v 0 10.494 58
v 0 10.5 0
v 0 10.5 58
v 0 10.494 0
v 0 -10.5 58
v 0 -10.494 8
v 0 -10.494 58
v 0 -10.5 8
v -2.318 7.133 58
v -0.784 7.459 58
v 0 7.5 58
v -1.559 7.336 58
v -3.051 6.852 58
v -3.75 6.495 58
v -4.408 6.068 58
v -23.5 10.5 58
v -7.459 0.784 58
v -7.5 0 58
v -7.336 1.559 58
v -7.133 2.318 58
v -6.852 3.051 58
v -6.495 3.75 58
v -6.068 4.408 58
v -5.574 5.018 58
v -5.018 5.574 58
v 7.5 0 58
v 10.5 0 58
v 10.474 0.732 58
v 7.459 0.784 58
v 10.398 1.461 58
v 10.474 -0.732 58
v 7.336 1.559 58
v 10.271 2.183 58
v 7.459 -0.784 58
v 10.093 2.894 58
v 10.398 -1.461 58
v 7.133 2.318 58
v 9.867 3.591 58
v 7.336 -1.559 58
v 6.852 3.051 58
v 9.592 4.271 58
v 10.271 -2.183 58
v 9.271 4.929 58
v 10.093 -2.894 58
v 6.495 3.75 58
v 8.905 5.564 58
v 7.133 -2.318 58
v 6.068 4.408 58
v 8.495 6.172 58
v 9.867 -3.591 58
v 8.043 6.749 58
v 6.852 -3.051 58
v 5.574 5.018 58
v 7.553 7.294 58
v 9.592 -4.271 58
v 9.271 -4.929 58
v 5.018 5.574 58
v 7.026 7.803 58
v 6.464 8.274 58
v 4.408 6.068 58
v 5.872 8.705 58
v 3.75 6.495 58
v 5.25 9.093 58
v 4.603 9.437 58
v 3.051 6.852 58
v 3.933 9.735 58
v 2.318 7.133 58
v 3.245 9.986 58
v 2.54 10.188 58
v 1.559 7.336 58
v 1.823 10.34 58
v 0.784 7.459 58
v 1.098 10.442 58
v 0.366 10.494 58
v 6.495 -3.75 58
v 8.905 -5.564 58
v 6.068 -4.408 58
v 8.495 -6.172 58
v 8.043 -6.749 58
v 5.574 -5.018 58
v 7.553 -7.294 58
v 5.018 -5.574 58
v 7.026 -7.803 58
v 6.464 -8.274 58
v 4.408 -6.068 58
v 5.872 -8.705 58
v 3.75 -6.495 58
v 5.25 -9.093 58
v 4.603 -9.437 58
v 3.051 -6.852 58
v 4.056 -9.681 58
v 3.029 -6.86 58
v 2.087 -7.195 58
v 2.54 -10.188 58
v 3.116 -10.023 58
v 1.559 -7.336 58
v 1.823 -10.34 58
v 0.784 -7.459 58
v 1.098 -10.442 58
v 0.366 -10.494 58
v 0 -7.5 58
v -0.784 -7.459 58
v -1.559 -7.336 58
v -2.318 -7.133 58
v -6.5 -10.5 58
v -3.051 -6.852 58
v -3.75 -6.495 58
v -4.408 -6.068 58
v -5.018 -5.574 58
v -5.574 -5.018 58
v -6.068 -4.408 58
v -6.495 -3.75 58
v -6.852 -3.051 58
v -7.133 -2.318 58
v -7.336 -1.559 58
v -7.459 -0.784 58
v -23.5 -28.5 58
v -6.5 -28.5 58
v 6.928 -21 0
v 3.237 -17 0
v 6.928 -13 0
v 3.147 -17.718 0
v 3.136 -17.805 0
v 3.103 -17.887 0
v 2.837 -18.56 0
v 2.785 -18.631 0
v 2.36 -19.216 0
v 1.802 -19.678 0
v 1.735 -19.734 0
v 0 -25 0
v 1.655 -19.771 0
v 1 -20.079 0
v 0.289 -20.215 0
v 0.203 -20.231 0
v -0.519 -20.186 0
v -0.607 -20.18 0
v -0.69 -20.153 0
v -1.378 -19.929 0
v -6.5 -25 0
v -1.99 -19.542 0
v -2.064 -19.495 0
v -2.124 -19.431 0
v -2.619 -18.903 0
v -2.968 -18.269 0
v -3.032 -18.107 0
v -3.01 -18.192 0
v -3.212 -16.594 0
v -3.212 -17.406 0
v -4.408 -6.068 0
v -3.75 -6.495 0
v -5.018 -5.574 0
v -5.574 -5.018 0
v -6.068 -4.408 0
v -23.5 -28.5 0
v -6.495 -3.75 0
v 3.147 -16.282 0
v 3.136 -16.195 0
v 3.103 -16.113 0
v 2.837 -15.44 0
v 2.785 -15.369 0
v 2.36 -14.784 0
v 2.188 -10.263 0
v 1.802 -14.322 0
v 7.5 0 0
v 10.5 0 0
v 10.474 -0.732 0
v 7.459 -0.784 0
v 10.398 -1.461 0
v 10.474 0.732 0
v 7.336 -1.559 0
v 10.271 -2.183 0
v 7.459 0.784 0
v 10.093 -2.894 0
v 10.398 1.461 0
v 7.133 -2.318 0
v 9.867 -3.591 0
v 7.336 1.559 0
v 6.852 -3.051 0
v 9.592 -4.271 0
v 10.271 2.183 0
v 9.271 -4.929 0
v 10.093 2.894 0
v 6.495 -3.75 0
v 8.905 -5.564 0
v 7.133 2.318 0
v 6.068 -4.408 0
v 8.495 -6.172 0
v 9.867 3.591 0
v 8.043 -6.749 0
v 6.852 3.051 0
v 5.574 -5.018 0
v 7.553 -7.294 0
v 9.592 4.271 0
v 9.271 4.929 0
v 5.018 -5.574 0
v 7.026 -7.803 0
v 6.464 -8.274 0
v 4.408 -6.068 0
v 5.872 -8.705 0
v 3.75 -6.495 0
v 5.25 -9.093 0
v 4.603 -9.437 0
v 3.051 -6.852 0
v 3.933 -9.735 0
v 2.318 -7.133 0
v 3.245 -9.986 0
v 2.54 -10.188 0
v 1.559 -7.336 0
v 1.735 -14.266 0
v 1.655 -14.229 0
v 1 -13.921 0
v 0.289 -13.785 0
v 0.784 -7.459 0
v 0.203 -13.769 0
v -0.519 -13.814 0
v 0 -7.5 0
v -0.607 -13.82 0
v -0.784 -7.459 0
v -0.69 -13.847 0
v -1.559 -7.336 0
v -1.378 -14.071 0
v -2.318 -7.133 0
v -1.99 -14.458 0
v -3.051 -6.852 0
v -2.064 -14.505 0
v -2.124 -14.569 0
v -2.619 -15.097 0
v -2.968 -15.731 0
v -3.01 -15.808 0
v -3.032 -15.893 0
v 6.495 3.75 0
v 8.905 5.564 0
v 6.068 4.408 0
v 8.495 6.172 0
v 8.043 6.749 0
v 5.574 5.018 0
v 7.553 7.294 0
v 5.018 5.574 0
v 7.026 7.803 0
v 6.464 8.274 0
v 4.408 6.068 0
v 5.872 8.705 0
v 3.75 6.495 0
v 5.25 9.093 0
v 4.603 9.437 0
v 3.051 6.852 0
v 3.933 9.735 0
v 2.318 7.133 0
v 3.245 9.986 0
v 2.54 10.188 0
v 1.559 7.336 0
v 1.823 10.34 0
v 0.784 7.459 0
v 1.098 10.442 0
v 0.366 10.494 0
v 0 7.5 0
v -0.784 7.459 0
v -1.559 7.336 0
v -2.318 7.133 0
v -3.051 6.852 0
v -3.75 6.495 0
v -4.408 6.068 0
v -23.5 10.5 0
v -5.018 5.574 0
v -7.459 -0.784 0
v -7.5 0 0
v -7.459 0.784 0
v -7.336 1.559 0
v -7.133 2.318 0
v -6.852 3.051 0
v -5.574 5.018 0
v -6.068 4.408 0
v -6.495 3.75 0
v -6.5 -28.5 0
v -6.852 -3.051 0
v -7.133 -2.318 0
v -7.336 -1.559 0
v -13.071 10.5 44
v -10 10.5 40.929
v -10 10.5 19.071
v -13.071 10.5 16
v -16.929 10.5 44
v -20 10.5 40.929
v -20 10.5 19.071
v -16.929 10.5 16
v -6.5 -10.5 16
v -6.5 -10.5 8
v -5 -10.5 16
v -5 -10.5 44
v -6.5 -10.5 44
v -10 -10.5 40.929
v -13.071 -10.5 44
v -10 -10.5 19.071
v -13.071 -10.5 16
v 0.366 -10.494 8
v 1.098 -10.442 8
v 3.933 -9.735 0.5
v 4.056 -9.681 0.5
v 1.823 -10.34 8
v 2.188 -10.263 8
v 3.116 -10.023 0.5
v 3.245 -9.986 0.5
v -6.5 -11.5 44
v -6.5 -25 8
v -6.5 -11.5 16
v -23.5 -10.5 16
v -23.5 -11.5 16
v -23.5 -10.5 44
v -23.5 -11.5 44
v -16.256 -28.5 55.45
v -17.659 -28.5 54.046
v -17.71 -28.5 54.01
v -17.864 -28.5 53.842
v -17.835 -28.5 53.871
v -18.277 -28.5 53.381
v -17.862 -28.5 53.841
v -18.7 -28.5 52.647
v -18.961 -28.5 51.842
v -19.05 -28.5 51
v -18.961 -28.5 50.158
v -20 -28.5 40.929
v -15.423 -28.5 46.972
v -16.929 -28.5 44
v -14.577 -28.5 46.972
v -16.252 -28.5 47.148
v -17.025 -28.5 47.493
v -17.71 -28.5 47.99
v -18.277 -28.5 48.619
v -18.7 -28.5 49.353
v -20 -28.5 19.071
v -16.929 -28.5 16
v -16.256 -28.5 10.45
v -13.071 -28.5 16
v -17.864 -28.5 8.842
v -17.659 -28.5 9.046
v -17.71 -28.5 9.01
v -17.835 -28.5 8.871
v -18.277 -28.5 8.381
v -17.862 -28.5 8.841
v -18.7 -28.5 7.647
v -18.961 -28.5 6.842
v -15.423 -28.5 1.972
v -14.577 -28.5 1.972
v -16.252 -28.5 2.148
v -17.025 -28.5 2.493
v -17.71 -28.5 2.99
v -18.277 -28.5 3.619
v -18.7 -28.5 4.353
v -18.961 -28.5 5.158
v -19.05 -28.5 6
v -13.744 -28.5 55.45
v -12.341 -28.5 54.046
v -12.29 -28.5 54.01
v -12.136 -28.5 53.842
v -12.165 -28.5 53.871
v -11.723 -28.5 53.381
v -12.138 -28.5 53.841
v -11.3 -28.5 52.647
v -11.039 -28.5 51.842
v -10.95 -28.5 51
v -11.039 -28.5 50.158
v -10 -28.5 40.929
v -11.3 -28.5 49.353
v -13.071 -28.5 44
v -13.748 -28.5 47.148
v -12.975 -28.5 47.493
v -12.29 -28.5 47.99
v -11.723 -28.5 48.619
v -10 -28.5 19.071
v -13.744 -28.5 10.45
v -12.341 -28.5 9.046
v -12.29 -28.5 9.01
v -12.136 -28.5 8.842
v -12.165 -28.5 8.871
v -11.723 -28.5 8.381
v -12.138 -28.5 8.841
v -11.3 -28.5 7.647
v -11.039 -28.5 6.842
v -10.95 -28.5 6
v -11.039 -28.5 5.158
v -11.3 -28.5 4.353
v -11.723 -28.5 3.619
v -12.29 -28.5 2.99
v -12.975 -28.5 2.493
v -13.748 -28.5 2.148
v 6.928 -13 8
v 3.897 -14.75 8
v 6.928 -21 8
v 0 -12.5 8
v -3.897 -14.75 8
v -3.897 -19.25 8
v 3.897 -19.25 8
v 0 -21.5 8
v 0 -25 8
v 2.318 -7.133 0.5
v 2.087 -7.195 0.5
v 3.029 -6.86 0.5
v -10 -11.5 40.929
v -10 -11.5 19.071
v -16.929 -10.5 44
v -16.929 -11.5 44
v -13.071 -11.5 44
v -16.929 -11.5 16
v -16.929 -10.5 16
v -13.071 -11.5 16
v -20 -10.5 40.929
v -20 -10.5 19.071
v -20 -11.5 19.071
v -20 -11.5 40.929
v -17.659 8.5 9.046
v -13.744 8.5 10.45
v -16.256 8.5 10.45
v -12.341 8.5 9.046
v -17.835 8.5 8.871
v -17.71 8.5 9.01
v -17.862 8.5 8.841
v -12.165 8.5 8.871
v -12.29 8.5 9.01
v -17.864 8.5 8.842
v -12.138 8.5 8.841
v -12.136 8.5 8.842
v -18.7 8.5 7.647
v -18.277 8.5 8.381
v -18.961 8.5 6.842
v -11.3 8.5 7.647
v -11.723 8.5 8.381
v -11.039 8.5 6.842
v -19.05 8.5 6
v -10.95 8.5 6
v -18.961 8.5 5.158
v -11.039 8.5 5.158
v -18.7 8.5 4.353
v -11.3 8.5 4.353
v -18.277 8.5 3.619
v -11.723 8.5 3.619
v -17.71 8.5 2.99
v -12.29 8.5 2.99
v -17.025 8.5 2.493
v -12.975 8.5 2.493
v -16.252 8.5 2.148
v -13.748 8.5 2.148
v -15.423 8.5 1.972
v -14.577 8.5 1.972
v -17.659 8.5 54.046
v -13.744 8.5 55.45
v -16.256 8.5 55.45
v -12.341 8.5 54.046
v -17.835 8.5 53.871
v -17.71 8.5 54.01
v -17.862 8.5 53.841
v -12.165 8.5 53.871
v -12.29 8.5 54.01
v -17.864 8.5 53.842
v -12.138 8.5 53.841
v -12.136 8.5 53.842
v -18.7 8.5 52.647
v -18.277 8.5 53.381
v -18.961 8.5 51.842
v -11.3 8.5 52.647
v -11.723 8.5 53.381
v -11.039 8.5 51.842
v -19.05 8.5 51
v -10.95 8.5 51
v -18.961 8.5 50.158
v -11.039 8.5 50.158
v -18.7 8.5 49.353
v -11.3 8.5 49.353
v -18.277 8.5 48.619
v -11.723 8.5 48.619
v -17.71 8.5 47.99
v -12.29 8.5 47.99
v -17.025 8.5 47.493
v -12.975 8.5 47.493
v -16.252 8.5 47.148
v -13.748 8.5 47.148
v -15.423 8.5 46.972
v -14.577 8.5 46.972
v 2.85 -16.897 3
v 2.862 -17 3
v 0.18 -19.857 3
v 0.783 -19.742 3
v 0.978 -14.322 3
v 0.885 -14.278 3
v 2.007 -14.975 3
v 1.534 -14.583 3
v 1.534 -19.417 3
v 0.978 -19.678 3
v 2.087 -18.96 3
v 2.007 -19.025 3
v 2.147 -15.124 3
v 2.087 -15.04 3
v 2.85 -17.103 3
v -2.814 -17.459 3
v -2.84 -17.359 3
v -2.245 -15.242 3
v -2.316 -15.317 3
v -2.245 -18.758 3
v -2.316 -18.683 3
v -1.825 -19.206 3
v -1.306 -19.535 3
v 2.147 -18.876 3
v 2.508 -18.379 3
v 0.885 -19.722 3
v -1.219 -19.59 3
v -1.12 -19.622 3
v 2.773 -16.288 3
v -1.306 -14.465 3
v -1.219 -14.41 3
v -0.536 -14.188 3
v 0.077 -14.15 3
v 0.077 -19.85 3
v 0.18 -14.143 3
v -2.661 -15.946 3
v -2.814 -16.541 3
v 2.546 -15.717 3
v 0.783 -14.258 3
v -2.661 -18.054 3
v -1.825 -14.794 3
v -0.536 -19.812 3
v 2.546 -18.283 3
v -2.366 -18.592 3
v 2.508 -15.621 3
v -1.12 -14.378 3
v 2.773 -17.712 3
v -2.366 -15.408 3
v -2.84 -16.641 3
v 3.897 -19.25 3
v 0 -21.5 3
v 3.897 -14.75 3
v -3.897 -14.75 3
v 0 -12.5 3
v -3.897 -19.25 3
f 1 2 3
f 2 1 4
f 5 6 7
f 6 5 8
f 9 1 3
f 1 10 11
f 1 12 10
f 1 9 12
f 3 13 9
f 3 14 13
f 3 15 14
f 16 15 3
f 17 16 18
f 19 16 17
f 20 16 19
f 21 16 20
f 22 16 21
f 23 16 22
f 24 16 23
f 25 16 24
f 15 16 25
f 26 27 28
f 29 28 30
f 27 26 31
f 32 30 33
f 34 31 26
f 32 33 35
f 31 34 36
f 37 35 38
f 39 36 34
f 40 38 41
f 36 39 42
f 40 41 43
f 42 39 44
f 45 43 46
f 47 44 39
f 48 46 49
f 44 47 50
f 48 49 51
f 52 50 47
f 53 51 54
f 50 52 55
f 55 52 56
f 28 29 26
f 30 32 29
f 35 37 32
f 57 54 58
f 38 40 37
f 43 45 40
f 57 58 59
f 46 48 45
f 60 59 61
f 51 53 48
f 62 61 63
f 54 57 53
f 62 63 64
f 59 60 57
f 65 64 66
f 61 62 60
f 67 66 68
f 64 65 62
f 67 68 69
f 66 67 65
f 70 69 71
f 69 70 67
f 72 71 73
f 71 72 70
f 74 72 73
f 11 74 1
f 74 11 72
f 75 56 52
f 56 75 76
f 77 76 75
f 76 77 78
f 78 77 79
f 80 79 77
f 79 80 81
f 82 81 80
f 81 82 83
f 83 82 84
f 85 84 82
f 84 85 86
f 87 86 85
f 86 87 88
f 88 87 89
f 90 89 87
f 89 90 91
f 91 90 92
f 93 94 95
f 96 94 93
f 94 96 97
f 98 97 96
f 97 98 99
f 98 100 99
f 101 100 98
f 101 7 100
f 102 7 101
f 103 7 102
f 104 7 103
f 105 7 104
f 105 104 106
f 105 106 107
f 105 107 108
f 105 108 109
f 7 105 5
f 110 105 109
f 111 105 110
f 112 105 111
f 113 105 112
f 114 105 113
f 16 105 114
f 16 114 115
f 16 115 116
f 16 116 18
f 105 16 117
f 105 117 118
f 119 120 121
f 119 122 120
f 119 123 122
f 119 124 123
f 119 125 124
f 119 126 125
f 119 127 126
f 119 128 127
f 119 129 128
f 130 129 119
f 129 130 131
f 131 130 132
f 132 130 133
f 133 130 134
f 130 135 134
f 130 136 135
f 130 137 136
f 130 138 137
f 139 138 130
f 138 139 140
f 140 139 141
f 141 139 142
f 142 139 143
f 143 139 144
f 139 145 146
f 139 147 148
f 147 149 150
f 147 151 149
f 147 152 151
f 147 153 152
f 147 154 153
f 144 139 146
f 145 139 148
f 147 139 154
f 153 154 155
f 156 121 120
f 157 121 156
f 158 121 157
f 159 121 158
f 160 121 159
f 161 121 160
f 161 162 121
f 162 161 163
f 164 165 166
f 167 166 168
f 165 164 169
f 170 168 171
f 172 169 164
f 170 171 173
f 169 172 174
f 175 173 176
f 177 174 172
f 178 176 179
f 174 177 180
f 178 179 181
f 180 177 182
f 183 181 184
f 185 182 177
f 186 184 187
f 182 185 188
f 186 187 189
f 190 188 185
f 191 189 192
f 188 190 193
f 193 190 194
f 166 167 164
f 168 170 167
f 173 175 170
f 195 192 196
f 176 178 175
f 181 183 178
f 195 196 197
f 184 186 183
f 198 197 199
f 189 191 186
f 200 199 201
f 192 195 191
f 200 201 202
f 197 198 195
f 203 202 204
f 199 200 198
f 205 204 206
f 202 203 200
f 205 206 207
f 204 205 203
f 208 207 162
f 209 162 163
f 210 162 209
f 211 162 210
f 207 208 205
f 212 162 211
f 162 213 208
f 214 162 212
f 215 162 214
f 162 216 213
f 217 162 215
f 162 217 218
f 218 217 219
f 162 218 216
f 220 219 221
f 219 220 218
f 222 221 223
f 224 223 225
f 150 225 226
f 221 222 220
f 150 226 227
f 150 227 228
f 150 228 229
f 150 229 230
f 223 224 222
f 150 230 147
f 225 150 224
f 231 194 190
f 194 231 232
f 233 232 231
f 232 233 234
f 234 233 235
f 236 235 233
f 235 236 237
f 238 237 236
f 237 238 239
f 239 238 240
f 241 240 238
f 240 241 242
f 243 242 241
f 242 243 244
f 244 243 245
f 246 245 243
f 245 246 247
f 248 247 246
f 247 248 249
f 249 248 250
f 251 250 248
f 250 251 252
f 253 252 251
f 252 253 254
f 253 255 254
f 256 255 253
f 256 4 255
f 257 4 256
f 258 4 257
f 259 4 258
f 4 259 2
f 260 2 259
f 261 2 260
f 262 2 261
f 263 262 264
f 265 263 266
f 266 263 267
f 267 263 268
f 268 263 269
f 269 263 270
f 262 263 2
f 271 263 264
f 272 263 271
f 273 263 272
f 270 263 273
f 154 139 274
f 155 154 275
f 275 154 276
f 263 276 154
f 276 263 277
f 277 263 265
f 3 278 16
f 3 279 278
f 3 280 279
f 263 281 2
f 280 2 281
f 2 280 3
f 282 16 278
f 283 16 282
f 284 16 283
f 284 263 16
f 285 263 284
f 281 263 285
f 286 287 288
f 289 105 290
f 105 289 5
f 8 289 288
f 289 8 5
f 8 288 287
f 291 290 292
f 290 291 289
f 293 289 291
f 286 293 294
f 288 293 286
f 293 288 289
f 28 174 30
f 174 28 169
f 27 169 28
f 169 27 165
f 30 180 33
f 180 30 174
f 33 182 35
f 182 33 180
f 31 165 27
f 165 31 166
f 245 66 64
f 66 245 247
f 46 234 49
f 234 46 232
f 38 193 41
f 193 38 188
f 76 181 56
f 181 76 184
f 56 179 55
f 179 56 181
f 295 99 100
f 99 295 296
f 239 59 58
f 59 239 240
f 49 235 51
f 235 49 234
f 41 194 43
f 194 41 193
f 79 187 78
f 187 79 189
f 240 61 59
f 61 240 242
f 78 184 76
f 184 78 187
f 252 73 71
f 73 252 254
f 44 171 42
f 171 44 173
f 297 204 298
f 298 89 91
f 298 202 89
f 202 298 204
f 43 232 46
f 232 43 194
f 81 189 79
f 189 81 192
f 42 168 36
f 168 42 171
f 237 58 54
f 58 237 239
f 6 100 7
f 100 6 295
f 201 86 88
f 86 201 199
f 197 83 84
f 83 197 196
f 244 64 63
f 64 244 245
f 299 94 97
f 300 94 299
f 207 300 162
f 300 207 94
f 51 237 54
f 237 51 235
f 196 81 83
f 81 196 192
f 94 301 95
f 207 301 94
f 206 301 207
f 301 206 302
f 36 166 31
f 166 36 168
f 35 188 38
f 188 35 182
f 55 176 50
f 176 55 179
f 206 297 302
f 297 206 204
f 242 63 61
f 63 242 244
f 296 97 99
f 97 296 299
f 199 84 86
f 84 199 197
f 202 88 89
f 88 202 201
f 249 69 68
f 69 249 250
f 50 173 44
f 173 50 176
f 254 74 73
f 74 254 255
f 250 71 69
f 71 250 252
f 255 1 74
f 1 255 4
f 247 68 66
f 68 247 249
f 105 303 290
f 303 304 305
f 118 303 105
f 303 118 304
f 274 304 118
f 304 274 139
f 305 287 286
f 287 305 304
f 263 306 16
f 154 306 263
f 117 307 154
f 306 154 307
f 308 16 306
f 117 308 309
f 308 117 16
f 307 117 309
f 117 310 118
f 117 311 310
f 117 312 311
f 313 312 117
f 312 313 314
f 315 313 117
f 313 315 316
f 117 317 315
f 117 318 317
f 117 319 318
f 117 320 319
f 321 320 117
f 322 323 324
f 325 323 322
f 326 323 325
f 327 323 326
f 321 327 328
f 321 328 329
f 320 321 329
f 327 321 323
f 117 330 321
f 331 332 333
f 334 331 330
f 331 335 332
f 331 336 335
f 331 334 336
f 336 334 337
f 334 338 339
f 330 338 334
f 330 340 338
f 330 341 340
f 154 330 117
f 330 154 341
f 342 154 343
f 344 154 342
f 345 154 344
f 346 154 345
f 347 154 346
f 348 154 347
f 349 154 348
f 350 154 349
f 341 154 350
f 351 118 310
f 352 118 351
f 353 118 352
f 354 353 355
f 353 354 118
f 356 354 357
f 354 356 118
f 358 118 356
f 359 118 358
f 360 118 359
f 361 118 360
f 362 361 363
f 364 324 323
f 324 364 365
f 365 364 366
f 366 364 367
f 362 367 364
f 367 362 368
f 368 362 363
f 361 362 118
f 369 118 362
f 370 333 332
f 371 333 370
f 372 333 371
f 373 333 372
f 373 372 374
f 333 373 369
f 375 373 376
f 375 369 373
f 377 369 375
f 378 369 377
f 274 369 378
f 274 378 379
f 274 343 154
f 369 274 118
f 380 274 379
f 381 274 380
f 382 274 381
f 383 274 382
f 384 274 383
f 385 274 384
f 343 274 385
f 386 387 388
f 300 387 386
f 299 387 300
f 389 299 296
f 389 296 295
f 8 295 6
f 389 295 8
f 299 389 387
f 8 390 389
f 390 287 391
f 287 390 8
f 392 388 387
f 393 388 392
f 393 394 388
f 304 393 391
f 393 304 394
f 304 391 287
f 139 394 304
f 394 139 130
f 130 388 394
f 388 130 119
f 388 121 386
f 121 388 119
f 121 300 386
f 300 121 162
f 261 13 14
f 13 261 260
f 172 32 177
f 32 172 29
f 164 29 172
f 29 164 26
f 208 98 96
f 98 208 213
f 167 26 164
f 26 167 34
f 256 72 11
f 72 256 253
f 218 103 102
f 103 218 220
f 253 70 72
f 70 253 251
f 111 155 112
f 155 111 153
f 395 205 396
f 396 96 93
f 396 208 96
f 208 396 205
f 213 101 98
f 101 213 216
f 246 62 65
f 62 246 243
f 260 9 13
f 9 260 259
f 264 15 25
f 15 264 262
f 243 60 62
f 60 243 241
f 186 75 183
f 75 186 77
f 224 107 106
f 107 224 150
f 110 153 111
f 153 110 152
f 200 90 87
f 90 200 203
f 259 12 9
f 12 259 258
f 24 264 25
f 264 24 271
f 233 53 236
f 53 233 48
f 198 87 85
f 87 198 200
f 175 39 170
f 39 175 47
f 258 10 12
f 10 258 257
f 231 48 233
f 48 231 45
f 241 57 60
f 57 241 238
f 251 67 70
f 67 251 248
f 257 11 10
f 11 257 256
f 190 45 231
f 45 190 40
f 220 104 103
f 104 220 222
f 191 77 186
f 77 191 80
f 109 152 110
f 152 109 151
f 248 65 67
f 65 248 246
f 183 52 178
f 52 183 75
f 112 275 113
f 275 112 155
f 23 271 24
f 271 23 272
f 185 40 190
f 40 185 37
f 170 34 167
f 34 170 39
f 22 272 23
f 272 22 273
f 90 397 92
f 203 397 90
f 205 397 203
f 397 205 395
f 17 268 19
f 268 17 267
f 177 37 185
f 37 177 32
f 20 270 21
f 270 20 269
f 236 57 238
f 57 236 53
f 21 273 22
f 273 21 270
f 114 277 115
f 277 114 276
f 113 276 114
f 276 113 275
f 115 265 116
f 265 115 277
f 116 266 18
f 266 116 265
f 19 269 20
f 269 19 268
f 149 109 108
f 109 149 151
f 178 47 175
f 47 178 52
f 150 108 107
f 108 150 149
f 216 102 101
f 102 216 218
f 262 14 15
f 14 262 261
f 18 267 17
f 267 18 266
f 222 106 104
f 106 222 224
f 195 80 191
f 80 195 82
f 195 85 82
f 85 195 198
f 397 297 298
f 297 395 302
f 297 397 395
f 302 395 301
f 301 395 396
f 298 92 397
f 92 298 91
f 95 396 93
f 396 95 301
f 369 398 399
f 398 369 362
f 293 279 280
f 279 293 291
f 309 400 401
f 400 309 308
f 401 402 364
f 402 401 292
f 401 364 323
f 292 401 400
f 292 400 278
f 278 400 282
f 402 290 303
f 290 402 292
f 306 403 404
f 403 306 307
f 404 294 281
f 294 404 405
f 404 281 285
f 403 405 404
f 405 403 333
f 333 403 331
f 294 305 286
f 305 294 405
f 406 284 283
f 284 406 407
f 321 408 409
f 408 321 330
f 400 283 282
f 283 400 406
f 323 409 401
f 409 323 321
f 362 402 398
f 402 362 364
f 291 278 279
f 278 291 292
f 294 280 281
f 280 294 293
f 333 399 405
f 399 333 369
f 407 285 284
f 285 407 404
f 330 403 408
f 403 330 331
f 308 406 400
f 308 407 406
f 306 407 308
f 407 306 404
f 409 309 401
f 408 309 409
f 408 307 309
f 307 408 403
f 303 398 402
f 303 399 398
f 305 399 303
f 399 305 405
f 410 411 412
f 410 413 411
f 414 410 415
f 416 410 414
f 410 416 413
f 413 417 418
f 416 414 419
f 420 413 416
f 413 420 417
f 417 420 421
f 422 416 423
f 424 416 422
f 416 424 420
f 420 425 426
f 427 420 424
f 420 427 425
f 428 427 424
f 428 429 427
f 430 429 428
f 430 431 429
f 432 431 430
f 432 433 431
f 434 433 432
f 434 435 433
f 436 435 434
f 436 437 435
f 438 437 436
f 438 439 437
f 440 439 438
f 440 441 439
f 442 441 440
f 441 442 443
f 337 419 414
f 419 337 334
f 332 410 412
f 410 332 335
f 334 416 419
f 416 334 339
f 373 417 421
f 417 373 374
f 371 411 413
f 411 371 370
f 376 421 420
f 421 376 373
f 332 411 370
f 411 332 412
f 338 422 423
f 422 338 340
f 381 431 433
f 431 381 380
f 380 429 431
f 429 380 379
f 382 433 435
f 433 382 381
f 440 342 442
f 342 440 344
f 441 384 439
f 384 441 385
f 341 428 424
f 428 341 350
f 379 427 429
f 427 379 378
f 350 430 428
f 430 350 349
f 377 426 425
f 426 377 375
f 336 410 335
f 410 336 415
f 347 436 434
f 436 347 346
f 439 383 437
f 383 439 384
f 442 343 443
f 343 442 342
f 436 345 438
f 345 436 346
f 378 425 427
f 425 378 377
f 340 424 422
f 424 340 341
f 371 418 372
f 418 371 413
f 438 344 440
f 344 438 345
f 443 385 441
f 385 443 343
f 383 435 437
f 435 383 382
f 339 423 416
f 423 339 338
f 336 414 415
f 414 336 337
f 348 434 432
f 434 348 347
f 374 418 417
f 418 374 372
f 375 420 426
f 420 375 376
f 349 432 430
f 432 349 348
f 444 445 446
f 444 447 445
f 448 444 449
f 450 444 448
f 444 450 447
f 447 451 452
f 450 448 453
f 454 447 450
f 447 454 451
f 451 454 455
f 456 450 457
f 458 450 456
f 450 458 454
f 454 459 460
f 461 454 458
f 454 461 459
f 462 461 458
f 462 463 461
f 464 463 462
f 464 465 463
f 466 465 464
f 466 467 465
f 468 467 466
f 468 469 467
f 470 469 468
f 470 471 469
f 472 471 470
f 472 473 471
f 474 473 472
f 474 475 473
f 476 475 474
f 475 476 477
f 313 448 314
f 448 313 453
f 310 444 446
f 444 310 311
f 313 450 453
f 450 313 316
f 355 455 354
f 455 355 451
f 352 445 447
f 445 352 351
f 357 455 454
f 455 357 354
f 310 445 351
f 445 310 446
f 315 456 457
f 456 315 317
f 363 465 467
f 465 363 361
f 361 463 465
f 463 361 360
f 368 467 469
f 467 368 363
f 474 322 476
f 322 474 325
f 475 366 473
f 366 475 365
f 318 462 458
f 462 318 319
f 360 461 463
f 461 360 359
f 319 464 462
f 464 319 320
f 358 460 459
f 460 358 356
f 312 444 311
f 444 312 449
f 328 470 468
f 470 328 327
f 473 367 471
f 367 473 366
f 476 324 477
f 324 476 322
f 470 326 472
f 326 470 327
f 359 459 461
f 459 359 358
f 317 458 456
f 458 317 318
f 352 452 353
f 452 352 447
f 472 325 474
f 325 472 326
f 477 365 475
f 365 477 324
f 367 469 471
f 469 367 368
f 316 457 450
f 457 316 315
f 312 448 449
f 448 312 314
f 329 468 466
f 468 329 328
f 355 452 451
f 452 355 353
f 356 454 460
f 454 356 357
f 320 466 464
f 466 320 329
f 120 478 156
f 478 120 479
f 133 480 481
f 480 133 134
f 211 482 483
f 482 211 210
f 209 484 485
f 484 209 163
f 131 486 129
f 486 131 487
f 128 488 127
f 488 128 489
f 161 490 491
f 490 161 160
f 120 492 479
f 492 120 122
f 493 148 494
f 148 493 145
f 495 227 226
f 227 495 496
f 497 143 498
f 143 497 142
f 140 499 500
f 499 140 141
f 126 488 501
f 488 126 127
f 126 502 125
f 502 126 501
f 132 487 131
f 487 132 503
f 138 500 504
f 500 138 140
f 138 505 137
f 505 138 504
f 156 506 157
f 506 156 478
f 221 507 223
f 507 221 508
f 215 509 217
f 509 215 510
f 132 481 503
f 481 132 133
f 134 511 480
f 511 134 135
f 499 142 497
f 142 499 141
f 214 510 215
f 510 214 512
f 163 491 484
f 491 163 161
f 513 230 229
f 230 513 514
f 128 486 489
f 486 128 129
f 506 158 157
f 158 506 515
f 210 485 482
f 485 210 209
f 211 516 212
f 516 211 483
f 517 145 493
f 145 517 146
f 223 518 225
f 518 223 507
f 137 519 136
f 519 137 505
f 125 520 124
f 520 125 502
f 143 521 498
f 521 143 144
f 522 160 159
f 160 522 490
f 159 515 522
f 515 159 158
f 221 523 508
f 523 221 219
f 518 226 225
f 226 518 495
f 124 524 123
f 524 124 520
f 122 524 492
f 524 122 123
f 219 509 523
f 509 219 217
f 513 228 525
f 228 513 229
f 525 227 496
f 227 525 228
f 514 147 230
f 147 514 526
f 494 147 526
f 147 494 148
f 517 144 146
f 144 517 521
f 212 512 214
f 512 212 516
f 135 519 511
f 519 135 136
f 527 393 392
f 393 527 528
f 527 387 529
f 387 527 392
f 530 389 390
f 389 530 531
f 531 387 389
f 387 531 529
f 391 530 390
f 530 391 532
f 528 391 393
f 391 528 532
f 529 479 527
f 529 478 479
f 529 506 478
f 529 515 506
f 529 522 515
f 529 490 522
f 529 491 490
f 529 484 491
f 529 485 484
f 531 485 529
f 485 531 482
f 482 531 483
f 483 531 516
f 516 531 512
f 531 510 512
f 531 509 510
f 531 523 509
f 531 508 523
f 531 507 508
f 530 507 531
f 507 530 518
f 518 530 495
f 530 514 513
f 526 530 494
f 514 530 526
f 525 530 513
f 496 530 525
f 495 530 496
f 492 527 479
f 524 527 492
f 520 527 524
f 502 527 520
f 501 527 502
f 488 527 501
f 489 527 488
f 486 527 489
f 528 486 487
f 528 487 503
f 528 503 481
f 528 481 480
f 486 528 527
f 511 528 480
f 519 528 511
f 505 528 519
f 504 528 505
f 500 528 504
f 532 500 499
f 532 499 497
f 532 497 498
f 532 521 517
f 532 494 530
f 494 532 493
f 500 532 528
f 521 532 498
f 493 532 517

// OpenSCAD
// file: bearing.scad
// PRUSA iteration3
// Bearing holders
// GNU GPL v3
// Josef Průša <iam@josefprusa.cz> and contributors
// http://www.reprap.org/wiki/Prusa_Mendel
// http://prusamendel.org

bearing_diameter = 15;

module horizontal_bearing_base(bearings=1){
 translate(v=[0,0,6]) cube(size = [24,8+bearings*25,12], center = true);	
}
module horizontal_bearing_holes(bearings=1){
 cutter_lenght = 10+bearings*25;
 one_holder_lenght = 8+25;
 holder_lenght = 8+bearings*25;
 
 // Main bearing cut
 difference(){
  translate(v=[0,0,12]) rotate(a=[90,0,0]) translate(v=[0,0,-cutter_lenght/2]) cylinder(h = cutter_lenght, r=bearing_diameter/2, $fn=50);
  // Bearing retainers
  translate(v=[0,1-holder_lenght/2,3]) cube(size = [24,6,8], center = true);
  translate(v=[0,-1+holder_lenght/2,3]) cube(size = [24,6,8], center = true);
 }
 
 // Ziptie cutouts
 ziptie_cut_ofset = 0;
 for ( i = [0 : bearings-1] ){
  // For easier positioning I move them by half of one 
  // bearing holder then add each bearign lenght and then center again
  translate(v=[0,-holder_lenght/2,0]) translate(v=[0,one_holder_lenght/2+i*25,0]) difference(){
   union(){
    translate(v=[0,2-6,12]) rotate(a=[90,0,0]) translate(v=[0,0,0]) cylinder(h = 4, r=12.5, $fn=50);
    translate(v=[0,2+6,12]) rotate(a=[90,0,0]) translate(v=[0,0,0]) cylinder(h = 4, r=12.5, $fn=50);
   }
   translate(v=[0,10,12]) rotate(a=[90,0,0]) translate(v=[0,0,0]) cylinder(h = 24, r=10, $fn=50);
  }
 }
 
}

module horizontal_bearing_test(){
 difference(){
  horizontal_bearing_base(1);
  horizontal_bearing_holes(1);
 }
 translate(v=[30,0,0]) difference(){
  horizontal_bearing_base(2);
  horizontal_bearing_holes(2);
 }
 translate(v=[60,0,0]) difference(){
  horizontal_bearing_base(3);
  horizontal_bearing_holes(3);
 }
}



thinwall = 3;
bearing_size = bearing_diameter + 2 * thinwall;

module vertical_bearing_base(){
 translate(v=[-2-bearing_size/4,0,29]) cube(size = [4+bearing_size/2,bearing_size,58], center = true);
 cylinder(h = 58, r=bearing_size/2, $fn = 90);
}

module vertical_bearing_holes(){
  translate(v=[0,0,-1]) cylinder(h = 62, r=bearing_diameter/2, $fn = 60);
  rotate(a=[0,0,-70]) translate(v=[8,0,31.5]) cube(size = [5,1,62], center = true);
}

difference(){
vertical_bearing_base();
vertical_bearing_holes();
}
// main file
// PRUSA iteration3
// X end prototype
// GNU GPL v3
// Josef Průša <iam@josefprusa.cz> and contributors
// http://www.reprap.org/wiki/Prusa_Mendel
// http://prusamendel.org

use <bearing.scad>
rod_distance = 45;

module x_end_base(){
// Main block
height = 58;
translate(v=[-15,-9,height/2]) cube(size = [17,39,height], center = true);
// Bearing holder
 vertical_bearing_base();	
//Nut trap
 // Cube
 translate(v=[-2-2,-17,4]) cube(size = [8,16,8], center = true);
 // Hexagon
 translate(v=[0,-17,0]) rotate([0,0,30]) cylinder(h = 8, r=8, $fn = 6);
}

module x_end_holes(){
 vertical_bearing_holes();
// Belt hole
translate(v=[-1,0,0]){
// Stress relief
translate(v=[-5.5-10+1.5,-10-1,30]) cube(size = [20,1,28], center = true);
difference(){
	translate(v=[-5.5-10+1.5,-10,30]) cube(size = [10,46,28], center = true);

	

	// Nice edges
	translate(v=[-5.5-10+1.5,-10,30+23]) rotate([0,45,0]) cube(size = [10,46,28], center = true);
	translate(v=[-5.5-10+1.5,-10,30+23]) rotate([0,-45,0]) cube(size = [10,46,28], center = true);
	translate(v=[-5.5-10+1.5,-10,30-23]) rotate([0,45,0]) cube(size = [10,46,28], center = true);
	translate(v=[-5.5-10+1.5,-10,30-23]) rotate([0,-45,0]) cube(size = [10,46,28], center = true);

}
}

// Bottom pushfit rod
translate(v=[-15,-41.5,6]) rotate(a=[-90,0,0]) pushfit_rod(8.1,50);
// Top pushfit rod
translate(v=[-15,-41.5,rod_distance+6]) rotate(a=[-90,0,0]) pushfit_rod(8.1,50);
// Nut trap
 translate(v=[0,-17,-0.5]) cylinder(h = 4, r1=3.3, r2=2.8, $fn=25);
 translate(v=[0,-17,3]) rotate([0,0,30]) cylinder(h = 10, r=4.5, $fn = 6);
}


// Final prototype
module x_end_plain(){
 difference(){
  x_end_base();
  x_end_holes();
 }
}

x_end_plain();


module pushfit_rod(diameter,length){
 cylinder(h = length, r=diameter/2, $fn=30);
 difference(){
 	translate(v=[0,-diameter/2.85,length/2]) rotate([0,0,45]) cube(size = [diameter/2,diameter/2,length], center = true);
 	translate(v=[0,-diameter/4-diameter/2-0.4,length/2]) rotate([0,0,0]) cube(size = [diameter,diameter/2,length], center = true);
 }
 //translate(v=[0,-diameter/2-2,length/2]) cube(size = [diameter,1,length], center = true);
}
